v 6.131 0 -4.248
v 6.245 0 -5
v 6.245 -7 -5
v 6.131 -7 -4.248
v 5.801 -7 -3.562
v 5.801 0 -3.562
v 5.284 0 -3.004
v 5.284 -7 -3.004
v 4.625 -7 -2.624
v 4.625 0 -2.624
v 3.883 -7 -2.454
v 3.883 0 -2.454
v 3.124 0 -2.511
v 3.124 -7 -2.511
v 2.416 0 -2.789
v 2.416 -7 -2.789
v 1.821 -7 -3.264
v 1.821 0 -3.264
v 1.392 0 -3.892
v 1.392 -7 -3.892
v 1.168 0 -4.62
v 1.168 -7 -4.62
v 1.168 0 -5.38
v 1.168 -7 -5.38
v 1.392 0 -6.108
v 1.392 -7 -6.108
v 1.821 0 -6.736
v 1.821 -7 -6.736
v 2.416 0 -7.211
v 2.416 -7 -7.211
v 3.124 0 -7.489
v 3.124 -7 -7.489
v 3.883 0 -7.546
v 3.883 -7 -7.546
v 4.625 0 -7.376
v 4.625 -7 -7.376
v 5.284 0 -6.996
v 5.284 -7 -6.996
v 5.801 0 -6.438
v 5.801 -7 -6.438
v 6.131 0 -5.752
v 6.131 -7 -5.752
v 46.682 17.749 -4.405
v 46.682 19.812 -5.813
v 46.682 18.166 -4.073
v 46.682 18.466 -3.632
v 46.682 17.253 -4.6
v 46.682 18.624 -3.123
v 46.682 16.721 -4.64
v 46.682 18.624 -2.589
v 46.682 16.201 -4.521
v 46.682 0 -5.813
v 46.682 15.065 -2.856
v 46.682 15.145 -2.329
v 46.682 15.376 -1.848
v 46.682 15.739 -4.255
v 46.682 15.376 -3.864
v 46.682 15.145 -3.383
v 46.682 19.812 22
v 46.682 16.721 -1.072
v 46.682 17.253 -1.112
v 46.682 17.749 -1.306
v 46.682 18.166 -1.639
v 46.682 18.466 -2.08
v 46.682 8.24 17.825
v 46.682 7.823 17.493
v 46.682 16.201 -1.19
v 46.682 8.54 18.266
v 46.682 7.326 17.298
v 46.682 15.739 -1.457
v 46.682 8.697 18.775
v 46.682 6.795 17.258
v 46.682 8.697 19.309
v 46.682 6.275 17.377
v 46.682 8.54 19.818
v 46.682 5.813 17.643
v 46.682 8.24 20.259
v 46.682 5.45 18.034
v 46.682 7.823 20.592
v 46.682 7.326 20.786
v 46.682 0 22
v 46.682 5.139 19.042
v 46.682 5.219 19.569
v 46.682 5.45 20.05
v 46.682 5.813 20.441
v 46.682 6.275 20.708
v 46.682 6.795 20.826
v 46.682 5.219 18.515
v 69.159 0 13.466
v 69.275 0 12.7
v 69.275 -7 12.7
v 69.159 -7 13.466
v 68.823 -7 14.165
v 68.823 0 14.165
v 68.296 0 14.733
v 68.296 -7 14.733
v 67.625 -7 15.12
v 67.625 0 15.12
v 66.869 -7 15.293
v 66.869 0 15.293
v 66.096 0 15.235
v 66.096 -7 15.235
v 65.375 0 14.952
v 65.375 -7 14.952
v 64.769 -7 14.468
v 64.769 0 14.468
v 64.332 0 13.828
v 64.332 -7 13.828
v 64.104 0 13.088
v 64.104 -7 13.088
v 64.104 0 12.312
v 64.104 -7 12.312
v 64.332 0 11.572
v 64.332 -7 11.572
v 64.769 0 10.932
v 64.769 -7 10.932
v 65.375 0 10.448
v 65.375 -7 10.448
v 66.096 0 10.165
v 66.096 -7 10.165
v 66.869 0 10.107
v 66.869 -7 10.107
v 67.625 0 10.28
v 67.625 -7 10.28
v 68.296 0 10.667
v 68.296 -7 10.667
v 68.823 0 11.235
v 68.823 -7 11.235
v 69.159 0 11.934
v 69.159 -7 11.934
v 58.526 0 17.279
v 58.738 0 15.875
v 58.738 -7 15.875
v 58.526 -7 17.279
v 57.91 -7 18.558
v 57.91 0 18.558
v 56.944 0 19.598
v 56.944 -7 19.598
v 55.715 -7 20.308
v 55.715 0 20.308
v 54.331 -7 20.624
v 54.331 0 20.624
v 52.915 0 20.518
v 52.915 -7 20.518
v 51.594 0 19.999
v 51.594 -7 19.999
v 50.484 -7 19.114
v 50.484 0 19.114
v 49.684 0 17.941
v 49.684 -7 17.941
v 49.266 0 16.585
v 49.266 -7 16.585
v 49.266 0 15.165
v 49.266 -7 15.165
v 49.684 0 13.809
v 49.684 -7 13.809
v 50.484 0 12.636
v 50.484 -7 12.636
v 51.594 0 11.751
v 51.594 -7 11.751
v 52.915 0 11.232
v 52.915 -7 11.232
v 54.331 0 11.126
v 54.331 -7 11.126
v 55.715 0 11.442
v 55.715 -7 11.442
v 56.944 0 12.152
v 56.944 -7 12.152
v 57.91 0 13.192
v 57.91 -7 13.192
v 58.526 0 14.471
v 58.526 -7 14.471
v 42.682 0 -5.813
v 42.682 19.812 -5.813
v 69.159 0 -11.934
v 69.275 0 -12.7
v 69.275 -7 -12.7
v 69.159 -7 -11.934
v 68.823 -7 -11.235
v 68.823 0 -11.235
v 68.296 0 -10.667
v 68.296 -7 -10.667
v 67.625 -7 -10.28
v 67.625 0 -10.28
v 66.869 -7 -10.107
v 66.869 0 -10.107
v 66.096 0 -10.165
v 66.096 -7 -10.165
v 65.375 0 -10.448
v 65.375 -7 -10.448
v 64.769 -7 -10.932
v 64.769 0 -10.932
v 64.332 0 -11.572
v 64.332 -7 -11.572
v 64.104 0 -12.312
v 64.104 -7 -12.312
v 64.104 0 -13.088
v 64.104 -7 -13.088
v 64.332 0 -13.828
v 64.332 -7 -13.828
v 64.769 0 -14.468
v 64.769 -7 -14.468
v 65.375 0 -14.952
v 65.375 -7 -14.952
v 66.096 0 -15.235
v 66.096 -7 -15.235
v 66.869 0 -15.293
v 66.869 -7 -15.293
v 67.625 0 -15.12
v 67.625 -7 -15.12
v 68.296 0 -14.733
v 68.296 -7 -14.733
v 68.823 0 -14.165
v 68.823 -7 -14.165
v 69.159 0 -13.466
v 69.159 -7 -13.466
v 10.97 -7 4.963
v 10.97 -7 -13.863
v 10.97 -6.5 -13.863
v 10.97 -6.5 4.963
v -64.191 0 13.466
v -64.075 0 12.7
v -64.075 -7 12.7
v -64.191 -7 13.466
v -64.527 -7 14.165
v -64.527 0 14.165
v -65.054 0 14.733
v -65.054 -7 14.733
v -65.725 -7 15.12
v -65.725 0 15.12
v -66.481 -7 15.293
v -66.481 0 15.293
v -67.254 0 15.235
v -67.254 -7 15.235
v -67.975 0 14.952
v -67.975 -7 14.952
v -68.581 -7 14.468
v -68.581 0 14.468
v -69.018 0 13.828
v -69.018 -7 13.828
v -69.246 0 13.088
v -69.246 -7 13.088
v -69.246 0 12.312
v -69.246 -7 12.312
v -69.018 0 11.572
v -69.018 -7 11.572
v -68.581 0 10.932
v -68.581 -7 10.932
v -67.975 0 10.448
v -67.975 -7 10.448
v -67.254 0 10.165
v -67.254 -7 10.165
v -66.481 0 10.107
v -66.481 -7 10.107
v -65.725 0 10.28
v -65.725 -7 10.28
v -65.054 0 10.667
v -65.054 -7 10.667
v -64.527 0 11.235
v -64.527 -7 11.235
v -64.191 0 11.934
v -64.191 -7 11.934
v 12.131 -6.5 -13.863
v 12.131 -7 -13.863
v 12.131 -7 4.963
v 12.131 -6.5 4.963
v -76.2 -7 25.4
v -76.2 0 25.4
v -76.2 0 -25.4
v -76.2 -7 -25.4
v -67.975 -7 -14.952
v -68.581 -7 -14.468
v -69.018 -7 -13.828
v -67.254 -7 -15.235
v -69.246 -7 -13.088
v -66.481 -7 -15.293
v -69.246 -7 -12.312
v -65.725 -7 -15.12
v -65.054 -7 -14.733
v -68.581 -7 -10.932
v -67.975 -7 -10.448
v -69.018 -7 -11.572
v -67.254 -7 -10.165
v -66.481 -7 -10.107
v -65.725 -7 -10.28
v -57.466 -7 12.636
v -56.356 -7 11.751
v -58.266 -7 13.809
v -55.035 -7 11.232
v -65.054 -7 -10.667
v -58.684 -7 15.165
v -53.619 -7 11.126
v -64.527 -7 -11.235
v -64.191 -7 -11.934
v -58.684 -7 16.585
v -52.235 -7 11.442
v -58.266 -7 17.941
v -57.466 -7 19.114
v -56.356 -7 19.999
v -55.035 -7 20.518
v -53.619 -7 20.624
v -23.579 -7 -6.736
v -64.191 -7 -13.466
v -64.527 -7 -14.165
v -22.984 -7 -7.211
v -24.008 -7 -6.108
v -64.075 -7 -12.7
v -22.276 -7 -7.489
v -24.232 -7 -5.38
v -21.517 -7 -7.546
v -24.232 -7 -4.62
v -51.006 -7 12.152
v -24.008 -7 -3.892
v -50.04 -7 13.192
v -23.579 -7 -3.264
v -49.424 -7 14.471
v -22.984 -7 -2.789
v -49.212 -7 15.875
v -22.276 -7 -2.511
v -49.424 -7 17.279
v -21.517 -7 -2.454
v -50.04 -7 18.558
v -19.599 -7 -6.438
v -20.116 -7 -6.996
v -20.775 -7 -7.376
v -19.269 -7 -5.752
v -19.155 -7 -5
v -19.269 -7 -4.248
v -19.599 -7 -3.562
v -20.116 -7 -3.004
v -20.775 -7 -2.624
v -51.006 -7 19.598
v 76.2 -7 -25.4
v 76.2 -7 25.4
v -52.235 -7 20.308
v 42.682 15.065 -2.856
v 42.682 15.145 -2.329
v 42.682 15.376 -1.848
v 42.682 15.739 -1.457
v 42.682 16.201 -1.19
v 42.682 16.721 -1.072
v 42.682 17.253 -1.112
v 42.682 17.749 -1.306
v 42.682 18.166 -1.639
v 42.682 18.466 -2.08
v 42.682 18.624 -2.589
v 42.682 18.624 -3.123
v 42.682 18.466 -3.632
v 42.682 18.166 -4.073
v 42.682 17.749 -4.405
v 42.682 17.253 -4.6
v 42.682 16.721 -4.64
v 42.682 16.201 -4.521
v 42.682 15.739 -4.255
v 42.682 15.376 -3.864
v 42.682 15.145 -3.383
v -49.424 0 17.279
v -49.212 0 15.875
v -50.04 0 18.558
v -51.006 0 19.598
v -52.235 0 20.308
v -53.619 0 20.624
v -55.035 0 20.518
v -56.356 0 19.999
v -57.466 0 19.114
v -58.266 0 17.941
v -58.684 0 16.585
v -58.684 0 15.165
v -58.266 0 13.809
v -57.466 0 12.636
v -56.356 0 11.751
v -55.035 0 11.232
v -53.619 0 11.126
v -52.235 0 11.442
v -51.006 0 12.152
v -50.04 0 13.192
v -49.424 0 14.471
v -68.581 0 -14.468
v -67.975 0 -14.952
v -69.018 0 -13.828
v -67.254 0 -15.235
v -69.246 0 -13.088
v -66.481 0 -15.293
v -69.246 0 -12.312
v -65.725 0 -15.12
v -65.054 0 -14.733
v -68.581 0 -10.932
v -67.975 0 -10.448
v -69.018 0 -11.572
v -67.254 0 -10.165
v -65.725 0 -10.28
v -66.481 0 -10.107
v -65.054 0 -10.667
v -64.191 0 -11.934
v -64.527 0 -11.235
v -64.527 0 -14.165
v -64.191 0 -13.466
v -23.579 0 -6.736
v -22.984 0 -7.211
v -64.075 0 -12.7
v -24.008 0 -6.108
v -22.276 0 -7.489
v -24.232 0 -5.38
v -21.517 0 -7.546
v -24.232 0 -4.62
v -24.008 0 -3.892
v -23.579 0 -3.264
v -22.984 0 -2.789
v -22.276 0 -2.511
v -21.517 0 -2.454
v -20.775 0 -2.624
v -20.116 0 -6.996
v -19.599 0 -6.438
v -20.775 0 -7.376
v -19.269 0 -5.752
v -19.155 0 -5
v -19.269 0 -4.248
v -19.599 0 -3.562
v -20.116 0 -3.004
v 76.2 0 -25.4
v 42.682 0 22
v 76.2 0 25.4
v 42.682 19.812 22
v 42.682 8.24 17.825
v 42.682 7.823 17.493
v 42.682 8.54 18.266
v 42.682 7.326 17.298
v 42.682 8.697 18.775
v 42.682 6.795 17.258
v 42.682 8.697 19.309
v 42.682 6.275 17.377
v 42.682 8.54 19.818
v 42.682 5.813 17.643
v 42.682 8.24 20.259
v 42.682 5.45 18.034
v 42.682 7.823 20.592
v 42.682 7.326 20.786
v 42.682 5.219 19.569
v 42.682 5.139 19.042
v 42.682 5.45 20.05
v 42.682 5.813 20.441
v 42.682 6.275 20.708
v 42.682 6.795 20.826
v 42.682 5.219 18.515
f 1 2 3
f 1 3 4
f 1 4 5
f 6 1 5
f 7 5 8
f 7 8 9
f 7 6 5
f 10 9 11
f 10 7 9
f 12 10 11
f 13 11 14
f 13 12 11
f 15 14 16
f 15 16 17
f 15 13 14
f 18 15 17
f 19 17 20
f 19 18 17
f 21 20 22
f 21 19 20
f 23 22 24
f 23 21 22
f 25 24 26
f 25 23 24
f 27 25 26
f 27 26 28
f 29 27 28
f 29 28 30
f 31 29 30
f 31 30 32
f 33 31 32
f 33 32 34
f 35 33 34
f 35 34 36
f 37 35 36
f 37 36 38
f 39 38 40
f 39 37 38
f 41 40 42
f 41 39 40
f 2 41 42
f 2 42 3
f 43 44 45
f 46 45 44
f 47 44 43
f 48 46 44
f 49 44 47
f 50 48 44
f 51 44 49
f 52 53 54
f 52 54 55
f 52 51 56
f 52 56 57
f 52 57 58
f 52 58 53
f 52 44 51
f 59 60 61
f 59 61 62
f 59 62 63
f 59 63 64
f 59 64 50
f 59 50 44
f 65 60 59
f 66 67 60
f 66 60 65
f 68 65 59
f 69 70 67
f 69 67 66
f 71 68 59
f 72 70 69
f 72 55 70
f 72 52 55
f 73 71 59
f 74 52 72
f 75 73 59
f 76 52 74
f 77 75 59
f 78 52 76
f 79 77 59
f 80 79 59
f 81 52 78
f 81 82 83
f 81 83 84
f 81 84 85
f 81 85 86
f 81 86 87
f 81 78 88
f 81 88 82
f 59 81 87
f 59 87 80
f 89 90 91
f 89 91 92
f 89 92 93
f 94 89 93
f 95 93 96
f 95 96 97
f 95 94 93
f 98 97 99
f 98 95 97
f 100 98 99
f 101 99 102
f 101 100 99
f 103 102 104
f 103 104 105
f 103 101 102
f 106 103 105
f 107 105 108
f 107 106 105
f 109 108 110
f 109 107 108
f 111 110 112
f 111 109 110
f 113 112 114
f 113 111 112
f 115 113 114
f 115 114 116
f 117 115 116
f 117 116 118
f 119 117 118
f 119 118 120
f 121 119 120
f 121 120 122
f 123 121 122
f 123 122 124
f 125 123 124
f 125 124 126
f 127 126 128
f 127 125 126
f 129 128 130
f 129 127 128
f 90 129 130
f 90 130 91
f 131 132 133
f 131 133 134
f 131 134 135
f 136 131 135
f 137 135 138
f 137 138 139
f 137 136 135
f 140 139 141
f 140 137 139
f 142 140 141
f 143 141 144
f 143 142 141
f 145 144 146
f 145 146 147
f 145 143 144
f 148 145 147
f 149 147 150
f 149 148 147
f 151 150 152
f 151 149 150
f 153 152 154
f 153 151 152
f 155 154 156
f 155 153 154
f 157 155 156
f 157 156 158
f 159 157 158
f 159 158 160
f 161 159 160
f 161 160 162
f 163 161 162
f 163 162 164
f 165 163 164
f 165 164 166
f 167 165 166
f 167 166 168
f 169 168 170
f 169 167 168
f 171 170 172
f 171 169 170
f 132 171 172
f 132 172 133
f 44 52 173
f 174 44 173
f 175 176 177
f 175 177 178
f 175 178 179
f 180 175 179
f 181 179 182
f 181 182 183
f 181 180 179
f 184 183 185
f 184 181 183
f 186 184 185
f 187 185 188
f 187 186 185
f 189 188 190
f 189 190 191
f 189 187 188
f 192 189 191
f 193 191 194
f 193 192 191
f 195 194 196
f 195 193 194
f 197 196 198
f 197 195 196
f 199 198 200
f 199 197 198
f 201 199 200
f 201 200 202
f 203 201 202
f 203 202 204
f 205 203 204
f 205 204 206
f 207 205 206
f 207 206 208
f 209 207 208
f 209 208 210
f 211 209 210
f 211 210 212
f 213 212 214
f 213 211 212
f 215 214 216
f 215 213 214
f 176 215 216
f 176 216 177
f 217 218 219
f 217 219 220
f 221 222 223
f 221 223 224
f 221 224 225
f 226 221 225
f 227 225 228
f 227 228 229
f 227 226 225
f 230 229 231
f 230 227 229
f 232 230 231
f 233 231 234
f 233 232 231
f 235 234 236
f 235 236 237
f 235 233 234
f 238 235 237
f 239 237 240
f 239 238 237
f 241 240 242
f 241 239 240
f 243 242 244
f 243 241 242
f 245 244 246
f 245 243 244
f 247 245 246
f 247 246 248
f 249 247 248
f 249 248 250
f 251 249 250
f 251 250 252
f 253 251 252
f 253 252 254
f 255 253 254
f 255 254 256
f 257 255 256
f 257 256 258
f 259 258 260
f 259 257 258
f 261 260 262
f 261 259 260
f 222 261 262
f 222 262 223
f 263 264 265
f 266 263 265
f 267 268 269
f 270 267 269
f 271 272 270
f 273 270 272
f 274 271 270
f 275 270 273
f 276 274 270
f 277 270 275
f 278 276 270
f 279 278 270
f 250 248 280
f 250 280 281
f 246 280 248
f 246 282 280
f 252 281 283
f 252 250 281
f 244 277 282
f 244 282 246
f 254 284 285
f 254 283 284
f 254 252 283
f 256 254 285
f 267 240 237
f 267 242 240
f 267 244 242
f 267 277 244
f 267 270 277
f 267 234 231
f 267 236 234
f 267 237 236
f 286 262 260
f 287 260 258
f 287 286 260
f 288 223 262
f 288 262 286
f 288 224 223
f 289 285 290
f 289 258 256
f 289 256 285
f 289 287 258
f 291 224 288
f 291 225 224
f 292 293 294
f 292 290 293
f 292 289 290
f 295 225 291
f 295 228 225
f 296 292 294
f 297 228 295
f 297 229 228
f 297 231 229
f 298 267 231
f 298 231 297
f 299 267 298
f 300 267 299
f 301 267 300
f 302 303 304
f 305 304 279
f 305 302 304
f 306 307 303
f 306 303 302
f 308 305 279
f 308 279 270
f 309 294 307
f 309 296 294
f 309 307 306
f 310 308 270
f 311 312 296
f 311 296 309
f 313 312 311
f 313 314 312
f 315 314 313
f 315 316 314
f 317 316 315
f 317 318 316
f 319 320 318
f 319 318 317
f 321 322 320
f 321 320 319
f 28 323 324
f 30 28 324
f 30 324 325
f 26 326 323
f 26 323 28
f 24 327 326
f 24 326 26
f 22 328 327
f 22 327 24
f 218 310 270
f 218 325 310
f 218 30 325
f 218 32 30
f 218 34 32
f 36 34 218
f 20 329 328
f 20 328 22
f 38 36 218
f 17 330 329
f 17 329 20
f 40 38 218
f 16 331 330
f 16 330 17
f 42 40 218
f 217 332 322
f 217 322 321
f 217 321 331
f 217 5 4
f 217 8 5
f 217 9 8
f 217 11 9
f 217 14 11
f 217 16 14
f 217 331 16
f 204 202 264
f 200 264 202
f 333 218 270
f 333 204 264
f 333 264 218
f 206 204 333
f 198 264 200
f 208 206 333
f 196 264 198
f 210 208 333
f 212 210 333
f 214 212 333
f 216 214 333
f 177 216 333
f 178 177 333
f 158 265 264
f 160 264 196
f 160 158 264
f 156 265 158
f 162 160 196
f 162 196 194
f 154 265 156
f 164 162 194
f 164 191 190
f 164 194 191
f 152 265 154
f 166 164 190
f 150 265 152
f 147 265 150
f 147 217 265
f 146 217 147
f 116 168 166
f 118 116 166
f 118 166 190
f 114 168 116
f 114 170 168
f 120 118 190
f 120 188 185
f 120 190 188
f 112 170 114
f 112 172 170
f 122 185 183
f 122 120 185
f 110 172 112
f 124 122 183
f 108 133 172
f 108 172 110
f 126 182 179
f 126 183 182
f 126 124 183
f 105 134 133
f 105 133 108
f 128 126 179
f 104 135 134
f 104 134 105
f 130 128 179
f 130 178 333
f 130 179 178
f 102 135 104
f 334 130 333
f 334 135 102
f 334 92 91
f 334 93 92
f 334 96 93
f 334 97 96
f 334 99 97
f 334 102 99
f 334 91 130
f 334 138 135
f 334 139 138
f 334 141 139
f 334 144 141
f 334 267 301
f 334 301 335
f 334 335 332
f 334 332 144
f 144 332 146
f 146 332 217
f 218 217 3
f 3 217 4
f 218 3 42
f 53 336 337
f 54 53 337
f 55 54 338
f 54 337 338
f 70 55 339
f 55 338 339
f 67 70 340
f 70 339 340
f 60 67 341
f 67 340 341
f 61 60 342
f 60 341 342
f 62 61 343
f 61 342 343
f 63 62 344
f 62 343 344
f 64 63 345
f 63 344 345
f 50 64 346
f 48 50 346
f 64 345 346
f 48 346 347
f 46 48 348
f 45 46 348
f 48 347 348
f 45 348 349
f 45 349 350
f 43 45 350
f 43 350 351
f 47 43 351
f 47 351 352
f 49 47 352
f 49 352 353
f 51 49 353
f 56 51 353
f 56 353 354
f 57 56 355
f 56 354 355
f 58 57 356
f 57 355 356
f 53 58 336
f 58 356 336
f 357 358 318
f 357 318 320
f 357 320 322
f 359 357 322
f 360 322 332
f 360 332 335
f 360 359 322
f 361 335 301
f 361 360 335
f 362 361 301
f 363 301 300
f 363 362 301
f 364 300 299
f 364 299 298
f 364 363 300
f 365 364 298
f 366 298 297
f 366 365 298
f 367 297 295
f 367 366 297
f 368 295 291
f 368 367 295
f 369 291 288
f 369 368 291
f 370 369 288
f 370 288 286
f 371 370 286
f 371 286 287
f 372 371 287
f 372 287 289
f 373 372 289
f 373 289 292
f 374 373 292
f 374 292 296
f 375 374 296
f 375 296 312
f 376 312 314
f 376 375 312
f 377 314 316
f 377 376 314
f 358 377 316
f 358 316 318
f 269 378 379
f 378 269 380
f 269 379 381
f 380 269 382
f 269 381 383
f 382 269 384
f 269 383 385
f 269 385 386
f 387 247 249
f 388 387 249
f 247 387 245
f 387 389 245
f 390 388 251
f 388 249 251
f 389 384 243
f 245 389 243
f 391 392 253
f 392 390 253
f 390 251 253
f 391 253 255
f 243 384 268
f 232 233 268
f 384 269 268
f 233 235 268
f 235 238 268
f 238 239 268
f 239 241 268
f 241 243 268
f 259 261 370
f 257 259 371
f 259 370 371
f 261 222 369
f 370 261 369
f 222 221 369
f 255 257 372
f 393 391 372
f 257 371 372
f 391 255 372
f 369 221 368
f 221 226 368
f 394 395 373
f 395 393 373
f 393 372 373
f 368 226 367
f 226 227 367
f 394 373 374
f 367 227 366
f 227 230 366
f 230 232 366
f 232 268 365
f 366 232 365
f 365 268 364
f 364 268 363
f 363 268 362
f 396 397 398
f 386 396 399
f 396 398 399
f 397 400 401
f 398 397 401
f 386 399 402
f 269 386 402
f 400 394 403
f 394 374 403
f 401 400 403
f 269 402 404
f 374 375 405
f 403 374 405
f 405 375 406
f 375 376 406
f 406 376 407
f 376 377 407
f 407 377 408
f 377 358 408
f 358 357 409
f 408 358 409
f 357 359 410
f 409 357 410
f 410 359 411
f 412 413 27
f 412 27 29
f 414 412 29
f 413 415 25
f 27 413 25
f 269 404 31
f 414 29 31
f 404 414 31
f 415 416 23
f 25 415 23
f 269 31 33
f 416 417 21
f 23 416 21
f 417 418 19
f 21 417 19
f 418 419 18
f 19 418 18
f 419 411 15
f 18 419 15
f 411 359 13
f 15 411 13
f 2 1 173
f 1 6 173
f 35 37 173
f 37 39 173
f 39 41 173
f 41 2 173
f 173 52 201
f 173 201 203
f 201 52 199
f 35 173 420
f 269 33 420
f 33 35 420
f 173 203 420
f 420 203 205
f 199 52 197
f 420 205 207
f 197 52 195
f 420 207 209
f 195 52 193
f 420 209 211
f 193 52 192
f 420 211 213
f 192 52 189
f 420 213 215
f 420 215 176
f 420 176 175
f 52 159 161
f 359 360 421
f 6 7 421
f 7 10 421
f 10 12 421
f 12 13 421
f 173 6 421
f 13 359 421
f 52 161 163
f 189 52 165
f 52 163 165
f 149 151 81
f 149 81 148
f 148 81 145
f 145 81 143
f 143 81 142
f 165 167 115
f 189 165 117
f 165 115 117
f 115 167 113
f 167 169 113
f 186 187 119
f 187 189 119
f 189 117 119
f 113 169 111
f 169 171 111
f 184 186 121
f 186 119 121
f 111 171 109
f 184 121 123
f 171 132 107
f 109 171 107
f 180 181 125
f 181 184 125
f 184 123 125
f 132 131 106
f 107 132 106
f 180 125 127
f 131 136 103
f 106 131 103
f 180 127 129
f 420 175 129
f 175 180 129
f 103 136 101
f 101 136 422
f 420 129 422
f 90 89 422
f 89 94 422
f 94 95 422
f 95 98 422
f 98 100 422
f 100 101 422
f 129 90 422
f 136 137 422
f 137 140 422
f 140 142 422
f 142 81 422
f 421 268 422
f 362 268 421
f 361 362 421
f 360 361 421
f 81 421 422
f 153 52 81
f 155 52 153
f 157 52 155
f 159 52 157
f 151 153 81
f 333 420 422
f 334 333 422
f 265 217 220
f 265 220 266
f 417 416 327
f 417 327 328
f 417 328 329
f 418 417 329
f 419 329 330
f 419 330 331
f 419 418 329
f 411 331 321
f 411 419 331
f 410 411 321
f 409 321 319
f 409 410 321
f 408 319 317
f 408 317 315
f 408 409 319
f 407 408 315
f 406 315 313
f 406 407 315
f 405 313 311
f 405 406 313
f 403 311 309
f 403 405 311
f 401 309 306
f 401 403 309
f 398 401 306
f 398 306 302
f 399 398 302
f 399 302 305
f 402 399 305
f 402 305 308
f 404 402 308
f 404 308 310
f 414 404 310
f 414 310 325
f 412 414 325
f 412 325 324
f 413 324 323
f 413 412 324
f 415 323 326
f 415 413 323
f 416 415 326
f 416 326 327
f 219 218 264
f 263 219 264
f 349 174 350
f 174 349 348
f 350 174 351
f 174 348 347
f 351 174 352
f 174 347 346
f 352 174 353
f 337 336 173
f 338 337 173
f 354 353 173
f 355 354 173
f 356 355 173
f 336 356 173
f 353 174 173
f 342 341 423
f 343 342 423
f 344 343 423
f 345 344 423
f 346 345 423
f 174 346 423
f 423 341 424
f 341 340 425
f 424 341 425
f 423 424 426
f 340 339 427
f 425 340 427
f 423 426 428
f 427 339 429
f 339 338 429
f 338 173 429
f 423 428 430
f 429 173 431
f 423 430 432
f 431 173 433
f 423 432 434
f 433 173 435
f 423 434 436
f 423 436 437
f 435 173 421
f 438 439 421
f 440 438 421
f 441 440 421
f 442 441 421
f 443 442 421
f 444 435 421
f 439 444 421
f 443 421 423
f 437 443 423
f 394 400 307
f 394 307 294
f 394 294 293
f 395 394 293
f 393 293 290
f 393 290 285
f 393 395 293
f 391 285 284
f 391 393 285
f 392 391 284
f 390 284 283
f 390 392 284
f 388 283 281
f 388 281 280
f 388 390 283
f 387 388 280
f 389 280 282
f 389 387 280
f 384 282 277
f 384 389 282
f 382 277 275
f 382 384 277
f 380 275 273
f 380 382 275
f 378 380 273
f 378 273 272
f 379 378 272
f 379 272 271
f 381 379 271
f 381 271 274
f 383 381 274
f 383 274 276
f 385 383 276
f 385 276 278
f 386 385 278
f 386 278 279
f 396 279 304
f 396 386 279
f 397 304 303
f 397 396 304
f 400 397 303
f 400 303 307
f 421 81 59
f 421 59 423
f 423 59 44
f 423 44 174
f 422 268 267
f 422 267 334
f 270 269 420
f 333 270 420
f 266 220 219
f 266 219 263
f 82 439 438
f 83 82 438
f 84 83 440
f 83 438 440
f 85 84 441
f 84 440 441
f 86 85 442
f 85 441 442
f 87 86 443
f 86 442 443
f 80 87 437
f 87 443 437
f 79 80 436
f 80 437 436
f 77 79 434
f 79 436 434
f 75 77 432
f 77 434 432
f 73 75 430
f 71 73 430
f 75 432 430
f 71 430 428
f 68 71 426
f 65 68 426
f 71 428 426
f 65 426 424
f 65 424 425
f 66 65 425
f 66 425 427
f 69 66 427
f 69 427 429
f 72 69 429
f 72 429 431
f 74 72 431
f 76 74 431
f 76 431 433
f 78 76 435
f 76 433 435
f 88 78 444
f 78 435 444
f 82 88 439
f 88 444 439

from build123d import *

# Parameters (mm, degrees)
F0_W     = 152.4
F0_H     = 25.4
F0_R     = 2.6
F0_R_2   = 2.5527
F0_R_3   = 4.7625
F1_DEPTH = 7
F3_DEPTH = 0.2
F4_W     = 1.160611
F4_H     = 18.825986
F5_DEPTH = 0.5
F6_W     = 4
F6_H     = 27.813
F7_DEPTH = 19.812
F8_R     = 1.7891
F9_DEPTH = 4


with BuildPart() as f1:
    # F0 (on Front) → F1 (new body)
    with BuildSketch(Plane.XZ):
        with Locations((0, -12.7)):
            Rectangle(F0_W, F0_H)
        with Locations((-66.675, -12.7)):
            Circle(F0_R, mode=Mode.SUBTRACT)
        with Locations((-21.7079, -5)):
            Circle(F0_R_2, mode=Mode.SUBTRACT)
        with Locations((66.675, -12.7)):
            Circle(F0_R, mode=Mode.SUBTRACT)
        with Locations((3.6921, -5)):
            Circle(F0_R_2, mode=Mode.SUBTRACT)
        with Locations((0, 12.7)):
            Rectangle(F0_W, F0_H)
        with Locations((-66.675, 12.7)):
            Circle(F0_R, mode=Mode.SUBTRACT)
        with Locations((-53.975, 15.875)):
            Circle(F0_R_3, mode=Mode.SUBTRACT)
        with Locations((66.675, 12.7)):
            Circle(F0_R, mode=Mode.SUBTRACT)
        with Locations((53.975, 15.875)):
            Circle(F0_R_3, mode=Mode.SUBTRACT)
    extrude(amount=F1_DEPTH)

    # F0 (on Front) → F3 (cut)
    with BuildSketch(Plane.XZ):
        with Locations((0, -12.7)):
            Rectangle(F0_W, F0_H)
        with Locations((-66.675, -12.7)):
            Circle(F0_R, mode=Mode.SUBTRACT)
        with Locations((-21.7079, -5)):
            Circle(F0_R_2, mode=Mode.SUBTRACT)
        with Locations((66.675, -12.7)):
            Circle(F0_R, mode=Mode.SUBTRACT)
        with Locations((3.6921, -5)):
            Circle(F0_R_2, mode=Mode.SUBTRACT)
        with Locations((0, 12.7)):
            Rectangle(F0_W, F0_H)
        with Locations((-66.675, 12.7)):
            Circle(F0_R, mode=Mode.SUBTRACT)
        with Locations((-53.975, 15.875)):
            Circle(F0_R_3, mode=Mode.SUBTRACT)
        with Locations((66.675, 12.7)):
            Circle(F0_R, mode=Mode.SUBTRACT)
        with Locations((53.975, 15.875)):
            Circle(F0_R_3, mode=Mode.SUBTRACT)
    extrude(amount=-F3_DEPTH, mode=Mode.SUBTRACT)

    # F4 (on face) → F5 (cut)
    with BuildSketch(Plane.XZ.offset(7)):
        with Locations((11.550757, -4.44987)):
            Rectangle(F4_W, F4_H)
    extrude(amount=-F5_DEPTH, mode=Mode.SUBTRACT)

    # F6 (on face) → F7 (join)
    with BuildSketch(Plane(origin=(0, 0, 0), x_dir=(-1, 0, 0), z_dir=(0, 1, 0))):
        with Locations((-44.681652, 8.0931)):
            Rectangle(F6_W, F6_H)
    extrude(amount=F7_DEPTH)

    # F8 (on face) → F9 (cut, through all)
    with BuildSketch(Plane(origin=(42.681652, 0, 0), x_dir=(0, -1, 0), z_dir=(-1, 0, 0))):
        with Locations((-16.8545, -2.8559)):
            Circle(F8_R)
        with Locations((-6.928358, 19.0421)):
            Circle(F8_R)
    extrude(amount=-F9_DEPTH, mode=Mode.SUBTRACT)


solid = f1.part
